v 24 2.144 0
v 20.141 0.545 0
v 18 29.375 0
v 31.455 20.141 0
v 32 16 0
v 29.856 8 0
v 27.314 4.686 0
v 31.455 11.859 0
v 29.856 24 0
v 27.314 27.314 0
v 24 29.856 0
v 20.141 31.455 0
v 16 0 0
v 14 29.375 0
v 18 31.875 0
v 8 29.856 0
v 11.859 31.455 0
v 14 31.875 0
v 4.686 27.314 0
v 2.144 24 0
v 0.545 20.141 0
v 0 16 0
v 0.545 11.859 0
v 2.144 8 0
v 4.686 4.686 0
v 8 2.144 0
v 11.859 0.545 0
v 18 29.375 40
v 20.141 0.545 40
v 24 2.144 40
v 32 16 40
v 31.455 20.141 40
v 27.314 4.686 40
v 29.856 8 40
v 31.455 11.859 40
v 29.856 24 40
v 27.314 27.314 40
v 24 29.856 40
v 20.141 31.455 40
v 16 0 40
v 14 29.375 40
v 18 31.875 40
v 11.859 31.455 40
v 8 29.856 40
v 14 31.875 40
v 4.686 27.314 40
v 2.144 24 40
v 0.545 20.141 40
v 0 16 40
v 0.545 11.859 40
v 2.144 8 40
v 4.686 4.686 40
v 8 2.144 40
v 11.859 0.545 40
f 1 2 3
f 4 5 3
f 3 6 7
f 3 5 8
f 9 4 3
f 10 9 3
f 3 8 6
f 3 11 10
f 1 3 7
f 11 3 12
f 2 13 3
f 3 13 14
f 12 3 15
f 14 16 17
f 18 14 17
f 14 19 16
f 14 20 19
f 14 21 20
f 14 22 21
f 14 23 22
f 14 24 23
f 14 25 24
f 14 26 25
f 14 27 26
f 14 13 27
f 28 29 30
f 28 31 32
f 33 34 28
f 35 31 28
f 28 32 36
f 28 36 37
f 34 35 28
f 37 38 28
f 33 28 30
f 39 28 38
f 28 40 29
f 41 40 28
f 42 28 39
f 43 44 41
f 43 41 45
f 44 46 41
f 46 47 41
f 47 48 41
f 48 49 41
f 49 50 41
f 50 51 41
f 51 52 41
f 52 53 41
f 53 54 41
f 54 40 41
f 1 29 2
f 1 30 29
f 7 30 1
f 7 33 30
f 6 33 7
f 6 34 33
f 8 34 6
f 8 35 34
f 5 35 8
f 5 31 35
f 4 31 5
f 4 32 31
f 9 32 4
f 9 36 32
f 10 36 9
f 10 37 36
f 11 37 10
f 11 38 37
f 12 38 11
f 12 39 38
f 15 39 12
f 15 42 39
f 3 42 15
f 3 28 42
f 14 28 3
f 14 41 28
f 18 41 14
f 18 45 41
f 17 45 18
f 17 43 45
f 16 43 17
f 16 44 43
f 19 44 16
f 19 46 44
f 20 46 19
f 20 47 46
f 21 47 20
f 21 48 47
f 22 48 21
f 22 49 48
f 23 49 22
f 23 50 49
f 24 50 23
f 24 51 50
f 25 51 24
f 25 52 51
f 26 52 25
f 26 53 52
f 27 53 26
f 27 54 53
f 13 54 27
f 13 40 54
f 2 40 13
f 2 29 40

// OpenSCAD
$fn = 32;

// ----------------------------------------------------------------------
// Keyway shaft: d32 shaft, key 4 x 2.5 mm
// ----------------------------------------------------------------------

// --- parameters (mm) ---
shaft_r = 16;             // shaft radius
key_w = 4;                // keyway width
key_d = 2.5;              // keyway depth below the surface line
plate_t = 40;             // shaft length, Z (extrusion height)

shaft_d = 2 * shaft_r;  // shaft diameter
circle_step = 15;  // polygon sampling step, degrees

profile = [[11.859, 31.455], [8, 29.856], [4.686, 27.314], [2.144, 24], [0.545, 20.141], [0, 16], [0.545, 11.859], [2.144, 8], [4.686, 4.686], [8, 2.144], [11.859, 0.545], [16, 0], [20.141, 0.545], [24, 2.144], [27.314, 4.686], [29.856, 8], [31.455, 11.859], [32, 16], [31.455, 20.141], [29.856, 24], [27.314, 27.314], [24, 29.856], [20.141, 31.455], [18, 31.875], [18, 29.375], [14, 29.375], [14, 31.875]];  // primary outline, 27 points, counter clockwise

// --- the one profile operation ---
linear_extrude(height = plate_t) polygon(points = profile);
